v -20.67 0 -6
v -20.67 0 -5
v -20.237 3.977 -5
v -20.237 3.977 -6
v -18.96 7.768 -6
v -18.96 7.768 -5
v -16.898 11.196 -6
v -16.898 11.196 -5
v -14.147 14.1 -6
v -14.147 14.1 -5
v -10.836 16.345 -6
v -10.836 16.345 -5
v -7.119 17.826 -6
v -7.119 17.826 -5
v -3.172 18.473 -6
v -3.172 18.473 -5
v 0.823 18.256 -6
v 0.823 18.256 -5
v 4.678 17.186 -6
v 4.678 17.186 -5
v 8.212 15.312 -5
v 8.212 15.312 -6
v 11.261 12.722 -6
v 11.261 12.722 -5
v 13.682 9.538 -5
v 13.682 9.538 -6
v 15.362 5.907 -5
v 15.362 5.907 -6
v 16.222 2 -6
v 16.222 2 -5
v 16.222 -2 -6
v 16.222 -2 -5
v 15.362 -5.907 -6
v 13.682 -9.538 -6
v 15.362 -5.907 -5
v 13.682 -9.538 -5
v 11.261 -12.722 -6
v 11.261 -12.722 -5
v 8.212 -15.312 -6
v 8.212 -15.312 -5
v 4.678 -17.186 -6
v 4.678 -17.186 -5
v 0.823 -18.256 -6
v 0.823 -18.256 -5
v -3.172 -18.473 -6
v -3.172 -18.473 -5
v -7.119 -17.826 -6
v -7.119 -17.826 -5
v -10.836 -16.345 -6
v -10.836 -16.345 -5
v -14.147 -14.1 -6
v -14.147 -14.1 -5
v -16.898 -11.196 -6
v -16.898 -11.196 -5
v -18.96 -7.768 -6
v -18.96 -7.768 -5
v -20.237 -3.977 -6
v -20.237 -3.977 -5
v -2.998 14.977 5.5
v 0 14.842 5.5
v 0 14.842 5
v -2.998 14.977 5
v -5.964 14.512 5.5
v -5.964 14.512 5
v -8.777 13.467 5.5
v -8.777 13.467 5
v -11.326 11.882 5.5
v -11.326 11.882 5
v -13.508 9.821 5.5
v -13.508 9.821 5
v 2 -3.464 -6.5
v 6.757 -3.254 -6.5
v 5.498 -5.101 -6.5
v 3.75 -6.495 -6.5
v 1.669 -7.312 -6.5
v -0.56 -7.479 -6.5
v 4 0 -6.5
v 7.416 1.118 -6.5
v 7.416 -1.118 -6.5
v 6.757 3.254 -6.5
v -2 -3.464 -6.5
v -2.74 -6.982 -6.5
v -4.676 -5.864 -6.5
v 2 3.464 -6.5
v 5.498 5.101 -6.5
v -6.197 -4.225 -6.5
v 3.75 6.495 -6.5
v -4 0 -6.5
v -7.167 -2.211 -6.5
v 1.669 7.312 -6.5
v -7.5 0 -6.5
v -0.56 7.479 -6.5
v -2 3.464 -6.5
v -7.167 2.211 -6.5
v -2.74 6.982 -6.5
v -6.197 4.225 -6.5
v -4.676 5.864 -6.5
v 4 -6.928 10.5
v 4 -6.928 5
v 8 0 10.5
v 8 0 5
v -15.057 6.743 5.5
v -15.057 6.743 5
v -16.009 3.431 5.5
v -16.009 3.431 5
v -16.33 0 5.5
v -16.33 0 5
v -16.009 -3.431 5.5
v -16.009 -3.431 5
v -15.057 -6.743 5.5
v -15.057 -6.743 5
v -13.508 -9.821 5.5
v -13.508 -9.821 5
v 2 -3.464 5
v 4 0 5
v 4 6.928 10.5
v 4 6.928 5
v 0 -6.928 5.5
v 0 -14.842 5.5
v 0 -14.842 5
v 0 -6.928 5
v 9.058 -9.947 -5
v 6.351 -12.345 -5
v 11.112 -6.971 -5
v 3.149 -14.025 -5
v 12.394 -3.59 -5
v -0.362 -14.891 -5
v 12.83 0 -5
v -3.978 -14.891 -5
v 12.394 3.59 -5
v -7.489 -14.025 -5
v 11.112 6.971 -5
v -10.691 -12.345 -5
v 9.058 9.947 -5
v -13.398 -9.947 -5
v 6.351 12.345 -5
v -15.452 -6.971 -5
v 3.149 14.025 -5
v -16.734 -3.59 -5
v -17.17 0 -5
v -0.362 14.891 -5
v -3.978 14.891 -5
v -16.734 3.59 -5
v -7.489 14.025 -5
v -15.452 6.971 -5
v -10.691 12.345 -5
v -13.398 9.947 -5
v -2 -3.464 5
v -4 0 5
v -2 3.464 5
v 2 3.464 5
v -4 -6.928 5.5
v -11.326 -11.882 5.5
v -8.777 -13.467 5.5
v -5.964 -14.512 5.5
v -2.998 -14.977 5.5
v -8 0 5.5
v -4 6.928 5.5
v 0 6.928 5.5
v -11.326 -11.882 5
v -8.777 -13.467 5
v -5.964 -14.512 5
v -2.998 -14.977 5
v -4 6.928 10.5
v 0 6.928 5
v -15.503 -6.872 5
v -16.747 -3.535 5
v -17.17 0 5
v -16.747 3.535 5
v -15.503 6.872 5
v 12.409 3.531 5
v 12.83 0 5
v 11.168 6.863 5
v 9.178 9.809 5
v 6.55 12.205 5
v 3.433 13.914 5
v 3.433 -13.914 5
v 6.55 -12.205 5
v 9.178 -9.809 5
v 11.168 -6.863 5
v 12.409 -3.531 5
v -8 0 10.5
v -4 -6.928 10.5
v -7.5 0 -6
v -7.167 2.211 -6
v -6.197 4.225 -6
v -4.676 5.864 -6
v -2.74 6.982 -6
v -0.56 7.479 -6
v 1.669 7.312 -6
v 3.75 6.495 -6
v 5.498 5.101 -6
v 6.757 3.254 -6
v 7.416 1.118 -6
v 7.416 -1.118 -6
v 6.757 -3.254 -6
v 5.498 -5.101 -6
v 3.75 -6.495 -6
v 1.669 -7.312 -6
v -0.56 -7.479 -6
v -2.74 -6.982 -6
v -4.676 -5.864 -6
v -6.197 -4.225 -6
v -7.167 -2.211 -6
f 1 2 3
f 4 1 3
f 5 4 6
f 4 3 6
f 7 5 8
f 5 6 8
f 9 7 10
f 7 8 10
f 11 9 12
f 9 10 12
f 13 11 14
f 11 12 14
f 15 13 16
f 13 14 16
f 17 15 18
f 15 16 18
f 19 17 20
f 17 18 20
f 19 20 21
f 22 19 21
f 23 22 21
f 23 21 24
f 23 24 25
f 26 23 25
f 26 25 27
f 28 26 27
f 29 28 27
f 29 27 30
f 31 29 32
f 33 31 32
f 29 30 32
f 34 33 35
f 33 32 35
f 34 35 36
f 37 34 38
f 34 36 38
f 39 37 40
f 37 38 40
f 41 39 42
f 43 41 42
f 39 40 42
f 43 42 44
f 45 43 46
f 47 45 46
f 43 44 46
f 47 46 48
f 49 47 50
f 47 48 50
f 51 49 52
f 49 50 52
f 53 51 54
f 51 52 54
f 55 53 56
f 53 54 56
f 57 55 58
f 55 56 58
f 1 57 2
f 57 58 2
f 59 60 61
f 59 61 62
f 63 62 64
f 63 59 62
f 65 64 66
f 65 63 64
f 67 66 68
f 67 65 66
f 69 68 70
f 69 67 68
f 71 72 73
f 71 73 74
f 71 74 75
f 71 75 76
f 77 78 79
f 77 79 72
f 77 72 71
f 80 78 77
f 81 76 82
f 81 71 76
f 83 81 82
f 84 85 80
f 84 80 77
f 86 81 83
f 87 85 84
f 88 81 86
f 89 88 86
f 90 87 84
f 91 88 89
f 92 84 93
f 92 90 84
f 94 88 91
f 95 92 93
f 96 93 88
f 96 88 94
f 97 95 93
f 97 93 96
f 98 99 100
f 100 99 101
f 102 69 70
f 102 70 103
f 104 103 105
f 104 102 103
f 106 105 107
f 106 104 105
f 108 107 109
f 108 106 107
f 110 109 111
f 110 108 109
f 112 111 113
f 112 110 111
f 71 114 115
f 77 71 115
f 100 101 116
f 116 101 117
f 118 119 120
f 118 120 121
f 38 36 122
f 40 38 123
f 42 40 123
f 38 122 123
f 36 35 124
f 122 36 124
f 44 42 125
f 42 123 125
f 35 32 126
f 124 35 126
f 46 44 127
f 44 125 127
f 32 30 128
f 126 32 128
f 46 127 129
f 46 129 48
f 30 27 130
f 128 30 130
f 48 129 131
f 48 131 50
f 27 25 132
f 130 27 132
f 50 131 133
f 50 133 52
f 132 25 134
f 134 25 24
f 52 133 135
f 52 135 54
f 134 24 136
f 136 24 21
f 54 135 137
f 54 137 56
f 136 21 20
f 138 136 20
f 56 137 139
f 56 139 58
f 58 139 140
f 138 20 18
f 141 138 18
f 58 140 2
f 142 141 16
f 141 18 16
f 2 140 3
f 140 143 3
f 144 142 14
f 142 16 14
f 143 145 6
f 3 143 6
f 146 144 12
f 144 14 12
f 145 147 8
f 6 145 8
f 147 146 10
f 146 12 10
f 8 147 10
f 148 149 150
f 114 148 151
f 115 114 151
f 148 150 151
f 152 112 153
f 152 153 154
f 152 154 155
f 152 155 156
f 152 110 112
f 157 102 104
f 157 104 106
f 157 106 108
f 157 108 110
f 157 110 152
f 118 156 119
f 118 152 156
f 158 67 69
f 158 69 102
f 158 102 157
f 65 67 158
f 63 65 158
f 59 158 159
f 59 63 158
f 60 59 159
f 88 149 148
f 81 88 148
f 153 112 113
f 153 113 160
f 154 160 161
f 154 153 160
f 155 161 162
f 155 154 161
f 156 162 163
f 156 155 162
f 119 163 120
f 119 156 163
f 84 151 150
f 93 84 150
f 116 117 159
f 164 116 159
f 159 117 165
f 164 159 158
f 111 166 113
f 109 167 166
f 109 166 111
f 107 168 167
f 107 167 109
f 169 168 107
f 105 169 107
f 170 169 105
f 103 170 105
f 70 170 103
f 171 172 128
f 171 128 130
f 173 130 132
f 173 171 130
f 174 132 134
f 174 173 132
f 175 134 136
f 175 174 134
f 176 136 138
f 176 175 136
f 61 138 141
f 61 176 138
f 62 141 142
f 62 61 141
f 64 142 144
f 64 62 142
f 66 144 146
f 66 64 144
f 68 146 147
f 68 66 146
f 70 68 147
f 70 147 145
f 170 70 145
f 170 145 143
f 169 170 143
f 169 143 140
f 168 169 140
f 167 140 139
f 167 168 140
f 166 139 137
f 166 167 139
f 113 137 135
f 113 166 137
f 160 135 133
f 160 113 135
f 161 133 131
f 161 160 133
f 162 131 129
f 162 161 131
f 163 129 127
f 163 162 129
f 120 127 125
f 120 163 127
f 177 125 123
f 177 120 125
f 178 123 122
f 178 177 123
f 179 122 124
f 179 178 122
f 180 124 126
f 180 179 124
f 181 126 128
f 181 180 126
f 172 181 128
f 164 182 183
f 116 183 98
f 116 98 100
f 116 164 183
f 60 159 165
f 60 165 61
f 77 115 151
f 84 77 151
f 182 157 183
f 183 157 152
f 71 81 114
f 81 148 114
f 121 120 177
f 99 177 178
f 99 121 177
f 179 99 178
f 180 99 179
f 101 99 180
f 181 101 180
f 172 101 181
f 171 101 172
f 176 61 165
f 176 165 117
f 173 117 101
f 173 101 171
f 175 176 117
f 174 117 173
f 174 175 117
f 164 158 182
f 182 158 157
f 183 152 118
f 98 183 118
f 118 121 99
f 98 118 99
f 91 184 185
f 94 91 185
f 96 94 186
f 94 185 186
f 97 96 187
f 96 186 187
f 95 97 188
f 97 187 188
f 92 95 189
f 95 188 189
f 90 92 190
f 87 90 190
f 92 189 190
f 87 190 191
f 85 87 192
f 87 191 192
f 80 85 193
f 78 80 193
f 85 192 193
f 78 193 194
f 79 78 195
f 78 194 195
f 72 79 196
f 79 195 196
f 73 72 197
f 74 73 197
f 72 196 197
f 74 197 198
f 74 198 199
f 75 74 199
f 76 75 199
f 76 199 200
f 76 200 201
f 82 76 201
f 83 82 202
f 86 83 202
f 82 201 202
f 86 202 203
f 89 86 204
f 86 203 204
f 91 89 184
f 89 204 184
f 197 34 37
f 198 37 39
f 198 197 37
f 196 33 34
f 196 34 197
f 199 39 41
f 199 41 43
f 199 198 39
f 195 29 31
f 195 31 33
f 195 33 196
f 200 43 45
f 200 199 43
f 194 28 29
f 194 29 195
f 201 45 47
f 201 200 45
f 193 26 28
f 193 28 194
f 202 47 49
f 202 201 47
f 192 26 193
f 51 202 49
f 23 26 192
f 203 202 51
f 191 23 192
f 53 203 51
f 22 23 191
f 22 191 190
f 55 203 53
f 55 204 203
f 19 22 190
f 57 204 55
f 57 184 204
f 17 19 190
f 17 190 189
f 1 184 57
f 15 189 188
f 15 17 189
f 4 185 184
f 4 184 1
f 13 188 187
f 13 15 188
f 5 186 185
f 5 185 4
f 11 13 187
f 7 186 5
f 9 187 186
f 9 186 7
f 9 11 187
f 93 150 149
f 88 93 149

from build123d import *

# Parameters (mm, degrees)
SKETCH1_R           = 15
BOSS_EXTRUDE1_DEPTH = 5
SKETCH3_R           = 18.5
SKETCH3_R_2         = 15
BOSS_EXTRUDE3_DEPTH = 1
SKETCH2_R           = 7.5
BOSS_EXTRUDE2_DEPTH = 0.5
BOSS_EXTRUDE5_DEPTH = 5.5
BOSS_EXTRUDE6_START = 0.5
BOSS_EXTRUDE6_DEPTH = 0.5


with BuildPart() as part:
    # Sketch1 → Boss-Extrude1 (new, symmetric)
    with BuildSketch(Plane.XY):
        with Locations((-2.17, 0)):
            Circle(SKETCH1_R)
        Polygon((-2, 3.464101615), (-4, 0), (-2, -3.464101615), (2, -3.464101615), (4, 0), (2, 3.464101615), align=None, mode=Mode.SUBTRACT)
    extrude(amount=BOSS_EXTRUDE1_DEPTH, both=True)

    # Sketch3 → Boss-Extrude3 (add)
    # profile 1 of 2: a face of its own
    with BuildSketch(Plane(origin=(0, 0, -5), x_dir=(-1, 0, 0), z_dir=(0, 0, -1))):
        with Locations((2.17, 0)):
            Circle(SKETCH3_R)
        with Locations(Location((2.17, 0, 0), (0, 0, 180))):
            Circle(SKETCH3_R_2, mode=Mode.SUBTRACT)
    # profile 2 of 2: a face of its own
    with BuildSketch(Plane(origin=(0, 0, -5), x_dir=(-1, 0, 0), z_dir=(0, 0, -1))):
        with Locations(Location((2.17, 0, 0), (0, 0, 180))):
            Circle(SKETCH3_R_2)
        Polygon((-4, 0), (-2, 3.464101615), (2, 3.464101615), (4, 0), (2, -3.464101615), (-2, -3.464101615), align=None, mode=Mode.SUBTRACT)
    extrude(amount=BOSS_EXTRUDE3_DEPTH)

    # Sketch2 → Boss-Extrude2 (add)
    with BuildSketch(Plane(origin=(0, 0, -6), x_dir=(-1, 0, 0), z_dir=(0, 0, -1))):
        Circle(SKETCH2_R)
        Polygon((2, -3.464101615), (-2, -3.464101615), (-4, 0), (-2, 3.464101615), (2, 3.464101615), (4, 0), align=None, mode=Mode.SUBTRACT)
    extrude(amount=BOSS_EXTRUDE2_DEPTH)

    # Sketch4 → Boss-Extrude5 (add)
    with BuildSketch(Plane.XY.offset(5)):
        Polygon((4, 6.92820323), (-4, 6.92820323), (-8, 0), (-4, -6.92820323), (4, -6.92820323), (8, 0), align=None)
    extrude(amount=BOSS_EXTRUDE5_DEPTH)

    # Sketch5 → Boss-Extrude6 (add)
    with BuildSketch(Plane.XY.offset(5).offset(BOSS_EXTRUDE6_START)):
        with BuildLine():
            ThreePointArc((-13.508064516, -9.820809184), (-7.396562926, -14.059980085), (0, -14.842206709))
            Line((0, -14.842206709), (0, -6.92820323))
            Line((0, -6.92820323), (-4, -6.92820323))
            Line((-4, -6.92820323), (-8, 0))
            Line((-8, 0), (-4, 6.92820323))
            Line((-4, 6.92820323), (0, 6.92820323))
            Line((0, 6.92820323), (0, 14.842206709))
            ThreePointArc((0, 14.842206709), (-7.396562926, 14.059980085), (-13.508064516, 9.820809184))
            ThreePointArc((-13.508064516, 9.820809184), (-16.33, 0), (-13.508064516, -9.820809184))
        make_face()
    extrude(amount=-BOSS_EXTRUDE6_DEPTH)


solid = part.part
